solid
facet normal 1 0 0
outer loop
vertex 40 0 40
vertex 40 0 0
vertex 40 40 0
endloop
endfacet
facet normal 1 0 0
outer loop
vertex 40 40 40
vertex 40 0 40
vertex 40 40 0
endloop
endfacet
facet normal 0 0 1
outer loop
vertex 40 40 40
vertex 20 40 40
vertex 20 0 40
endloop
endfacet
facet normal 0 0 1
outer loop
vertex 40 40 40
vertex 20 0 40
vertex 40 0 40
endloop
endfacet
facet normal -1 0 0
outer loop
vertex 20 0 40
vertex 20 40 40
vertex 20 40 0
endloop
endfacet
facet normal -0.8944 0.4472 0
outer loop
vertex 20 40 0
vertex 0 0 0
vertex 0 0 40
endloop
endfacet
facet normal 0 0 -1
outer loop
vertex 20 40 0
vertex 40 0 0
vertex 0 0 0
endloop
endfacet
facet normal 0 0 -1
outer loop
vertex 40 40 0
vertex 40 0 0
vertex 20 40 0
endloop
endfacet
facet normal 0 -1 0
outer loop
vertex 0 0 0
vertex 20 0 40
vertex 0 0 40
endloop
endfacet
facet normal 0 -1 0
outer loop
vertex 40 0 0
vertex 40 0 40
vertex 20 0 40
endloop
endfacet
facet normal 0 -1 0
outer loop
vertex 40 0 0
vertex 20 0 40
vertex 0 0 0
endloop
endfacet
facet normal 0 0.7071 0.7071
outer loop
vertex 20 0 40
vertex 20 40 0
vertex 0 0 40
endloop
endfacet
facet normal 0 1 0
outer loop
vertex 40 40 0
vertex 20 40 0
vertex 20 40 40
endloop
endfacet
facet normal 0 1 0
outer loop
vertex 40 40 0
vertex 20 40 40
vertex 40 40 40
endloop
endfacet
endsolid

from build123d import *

# Parameters (mm, degrees)
SKETCH1_W           = 40
SKETCH1_H           = 40
BOSS_EXTRUDE1_DEPTH = 40
CUT_EXTRUDE1_DEPTH  = 40
CUT_EXTRUDE4_DEPTH  = 20
CUT_EXTRUDE5_DEPTH  = 20
BOSS_EXTRUDE2_DEPTH = 20
CUT_EXTRUDE6_DEPTH  = 50


with BuildPart() as part:
    # Sketch1 → Boss-Extrude1 (new body)
    with BuildSketch(Plane.XY):
        with Locations((20, 20)):
            Rectangle(SKETCH1_W, SKETCH1_H)
    extrude(amount=BOSS_EXTRUDE1_DEPTH)

    # Sketch2 → Cut-Extrude1 (cut)
    with BuildSketch(Plane.XY.offset(40)):
        Polygon((0, 0), (20, 40), (0, 40), align=None)
    extrude(amount=-CUT_EXTRUDE1_DEPTH, mode=Mode.SUBTRACT)

    # Sketch7 → Cut-Extrude4 (cut)
    with BuildSketch(Plane.XY.offset(40)):
        Polygon((20, 40), (20, 0), (0, 0), align=None)
    extrude(amount=-CUT_EXTRUDE4_DEPTH, mode=Mode.SUBTRACT)

    # Sketch8 → Cut-Extrude5 (cut)
    with BuildSketch(Plane.XY.offset(20)):
        Polygon((20, 40), (0, 0), (20, 0), align=None)
    extrude(amount=-CUT_EXTRUDE5_DEPTH, mode=Mode.SUBTRACT)

    # Sketch9 → Boss-Extrude2 (add)
    with BuildSketch(Plane.ZY.offset(-20)):
        Polygon((0, 40), (40, 0), (0, 0), align=None)
    extrude(amount=BOSS_EXTRUDE2_DEPTH)

    # Sketch10 → Cut-Extrude6 (cut)
    with BuildSketch(Plane(origin=(0, 0, 0), x_dir=(-1, 0, 0), z_dir=(0, 0, -1))):
        Polygon((0, 0), (-20, 40), (0, 40), align=None)
    extrude(amount=-CUT_EXTRUDE6_DEPTH, mode=Mode.SUBTRACT)


solid = part.part
